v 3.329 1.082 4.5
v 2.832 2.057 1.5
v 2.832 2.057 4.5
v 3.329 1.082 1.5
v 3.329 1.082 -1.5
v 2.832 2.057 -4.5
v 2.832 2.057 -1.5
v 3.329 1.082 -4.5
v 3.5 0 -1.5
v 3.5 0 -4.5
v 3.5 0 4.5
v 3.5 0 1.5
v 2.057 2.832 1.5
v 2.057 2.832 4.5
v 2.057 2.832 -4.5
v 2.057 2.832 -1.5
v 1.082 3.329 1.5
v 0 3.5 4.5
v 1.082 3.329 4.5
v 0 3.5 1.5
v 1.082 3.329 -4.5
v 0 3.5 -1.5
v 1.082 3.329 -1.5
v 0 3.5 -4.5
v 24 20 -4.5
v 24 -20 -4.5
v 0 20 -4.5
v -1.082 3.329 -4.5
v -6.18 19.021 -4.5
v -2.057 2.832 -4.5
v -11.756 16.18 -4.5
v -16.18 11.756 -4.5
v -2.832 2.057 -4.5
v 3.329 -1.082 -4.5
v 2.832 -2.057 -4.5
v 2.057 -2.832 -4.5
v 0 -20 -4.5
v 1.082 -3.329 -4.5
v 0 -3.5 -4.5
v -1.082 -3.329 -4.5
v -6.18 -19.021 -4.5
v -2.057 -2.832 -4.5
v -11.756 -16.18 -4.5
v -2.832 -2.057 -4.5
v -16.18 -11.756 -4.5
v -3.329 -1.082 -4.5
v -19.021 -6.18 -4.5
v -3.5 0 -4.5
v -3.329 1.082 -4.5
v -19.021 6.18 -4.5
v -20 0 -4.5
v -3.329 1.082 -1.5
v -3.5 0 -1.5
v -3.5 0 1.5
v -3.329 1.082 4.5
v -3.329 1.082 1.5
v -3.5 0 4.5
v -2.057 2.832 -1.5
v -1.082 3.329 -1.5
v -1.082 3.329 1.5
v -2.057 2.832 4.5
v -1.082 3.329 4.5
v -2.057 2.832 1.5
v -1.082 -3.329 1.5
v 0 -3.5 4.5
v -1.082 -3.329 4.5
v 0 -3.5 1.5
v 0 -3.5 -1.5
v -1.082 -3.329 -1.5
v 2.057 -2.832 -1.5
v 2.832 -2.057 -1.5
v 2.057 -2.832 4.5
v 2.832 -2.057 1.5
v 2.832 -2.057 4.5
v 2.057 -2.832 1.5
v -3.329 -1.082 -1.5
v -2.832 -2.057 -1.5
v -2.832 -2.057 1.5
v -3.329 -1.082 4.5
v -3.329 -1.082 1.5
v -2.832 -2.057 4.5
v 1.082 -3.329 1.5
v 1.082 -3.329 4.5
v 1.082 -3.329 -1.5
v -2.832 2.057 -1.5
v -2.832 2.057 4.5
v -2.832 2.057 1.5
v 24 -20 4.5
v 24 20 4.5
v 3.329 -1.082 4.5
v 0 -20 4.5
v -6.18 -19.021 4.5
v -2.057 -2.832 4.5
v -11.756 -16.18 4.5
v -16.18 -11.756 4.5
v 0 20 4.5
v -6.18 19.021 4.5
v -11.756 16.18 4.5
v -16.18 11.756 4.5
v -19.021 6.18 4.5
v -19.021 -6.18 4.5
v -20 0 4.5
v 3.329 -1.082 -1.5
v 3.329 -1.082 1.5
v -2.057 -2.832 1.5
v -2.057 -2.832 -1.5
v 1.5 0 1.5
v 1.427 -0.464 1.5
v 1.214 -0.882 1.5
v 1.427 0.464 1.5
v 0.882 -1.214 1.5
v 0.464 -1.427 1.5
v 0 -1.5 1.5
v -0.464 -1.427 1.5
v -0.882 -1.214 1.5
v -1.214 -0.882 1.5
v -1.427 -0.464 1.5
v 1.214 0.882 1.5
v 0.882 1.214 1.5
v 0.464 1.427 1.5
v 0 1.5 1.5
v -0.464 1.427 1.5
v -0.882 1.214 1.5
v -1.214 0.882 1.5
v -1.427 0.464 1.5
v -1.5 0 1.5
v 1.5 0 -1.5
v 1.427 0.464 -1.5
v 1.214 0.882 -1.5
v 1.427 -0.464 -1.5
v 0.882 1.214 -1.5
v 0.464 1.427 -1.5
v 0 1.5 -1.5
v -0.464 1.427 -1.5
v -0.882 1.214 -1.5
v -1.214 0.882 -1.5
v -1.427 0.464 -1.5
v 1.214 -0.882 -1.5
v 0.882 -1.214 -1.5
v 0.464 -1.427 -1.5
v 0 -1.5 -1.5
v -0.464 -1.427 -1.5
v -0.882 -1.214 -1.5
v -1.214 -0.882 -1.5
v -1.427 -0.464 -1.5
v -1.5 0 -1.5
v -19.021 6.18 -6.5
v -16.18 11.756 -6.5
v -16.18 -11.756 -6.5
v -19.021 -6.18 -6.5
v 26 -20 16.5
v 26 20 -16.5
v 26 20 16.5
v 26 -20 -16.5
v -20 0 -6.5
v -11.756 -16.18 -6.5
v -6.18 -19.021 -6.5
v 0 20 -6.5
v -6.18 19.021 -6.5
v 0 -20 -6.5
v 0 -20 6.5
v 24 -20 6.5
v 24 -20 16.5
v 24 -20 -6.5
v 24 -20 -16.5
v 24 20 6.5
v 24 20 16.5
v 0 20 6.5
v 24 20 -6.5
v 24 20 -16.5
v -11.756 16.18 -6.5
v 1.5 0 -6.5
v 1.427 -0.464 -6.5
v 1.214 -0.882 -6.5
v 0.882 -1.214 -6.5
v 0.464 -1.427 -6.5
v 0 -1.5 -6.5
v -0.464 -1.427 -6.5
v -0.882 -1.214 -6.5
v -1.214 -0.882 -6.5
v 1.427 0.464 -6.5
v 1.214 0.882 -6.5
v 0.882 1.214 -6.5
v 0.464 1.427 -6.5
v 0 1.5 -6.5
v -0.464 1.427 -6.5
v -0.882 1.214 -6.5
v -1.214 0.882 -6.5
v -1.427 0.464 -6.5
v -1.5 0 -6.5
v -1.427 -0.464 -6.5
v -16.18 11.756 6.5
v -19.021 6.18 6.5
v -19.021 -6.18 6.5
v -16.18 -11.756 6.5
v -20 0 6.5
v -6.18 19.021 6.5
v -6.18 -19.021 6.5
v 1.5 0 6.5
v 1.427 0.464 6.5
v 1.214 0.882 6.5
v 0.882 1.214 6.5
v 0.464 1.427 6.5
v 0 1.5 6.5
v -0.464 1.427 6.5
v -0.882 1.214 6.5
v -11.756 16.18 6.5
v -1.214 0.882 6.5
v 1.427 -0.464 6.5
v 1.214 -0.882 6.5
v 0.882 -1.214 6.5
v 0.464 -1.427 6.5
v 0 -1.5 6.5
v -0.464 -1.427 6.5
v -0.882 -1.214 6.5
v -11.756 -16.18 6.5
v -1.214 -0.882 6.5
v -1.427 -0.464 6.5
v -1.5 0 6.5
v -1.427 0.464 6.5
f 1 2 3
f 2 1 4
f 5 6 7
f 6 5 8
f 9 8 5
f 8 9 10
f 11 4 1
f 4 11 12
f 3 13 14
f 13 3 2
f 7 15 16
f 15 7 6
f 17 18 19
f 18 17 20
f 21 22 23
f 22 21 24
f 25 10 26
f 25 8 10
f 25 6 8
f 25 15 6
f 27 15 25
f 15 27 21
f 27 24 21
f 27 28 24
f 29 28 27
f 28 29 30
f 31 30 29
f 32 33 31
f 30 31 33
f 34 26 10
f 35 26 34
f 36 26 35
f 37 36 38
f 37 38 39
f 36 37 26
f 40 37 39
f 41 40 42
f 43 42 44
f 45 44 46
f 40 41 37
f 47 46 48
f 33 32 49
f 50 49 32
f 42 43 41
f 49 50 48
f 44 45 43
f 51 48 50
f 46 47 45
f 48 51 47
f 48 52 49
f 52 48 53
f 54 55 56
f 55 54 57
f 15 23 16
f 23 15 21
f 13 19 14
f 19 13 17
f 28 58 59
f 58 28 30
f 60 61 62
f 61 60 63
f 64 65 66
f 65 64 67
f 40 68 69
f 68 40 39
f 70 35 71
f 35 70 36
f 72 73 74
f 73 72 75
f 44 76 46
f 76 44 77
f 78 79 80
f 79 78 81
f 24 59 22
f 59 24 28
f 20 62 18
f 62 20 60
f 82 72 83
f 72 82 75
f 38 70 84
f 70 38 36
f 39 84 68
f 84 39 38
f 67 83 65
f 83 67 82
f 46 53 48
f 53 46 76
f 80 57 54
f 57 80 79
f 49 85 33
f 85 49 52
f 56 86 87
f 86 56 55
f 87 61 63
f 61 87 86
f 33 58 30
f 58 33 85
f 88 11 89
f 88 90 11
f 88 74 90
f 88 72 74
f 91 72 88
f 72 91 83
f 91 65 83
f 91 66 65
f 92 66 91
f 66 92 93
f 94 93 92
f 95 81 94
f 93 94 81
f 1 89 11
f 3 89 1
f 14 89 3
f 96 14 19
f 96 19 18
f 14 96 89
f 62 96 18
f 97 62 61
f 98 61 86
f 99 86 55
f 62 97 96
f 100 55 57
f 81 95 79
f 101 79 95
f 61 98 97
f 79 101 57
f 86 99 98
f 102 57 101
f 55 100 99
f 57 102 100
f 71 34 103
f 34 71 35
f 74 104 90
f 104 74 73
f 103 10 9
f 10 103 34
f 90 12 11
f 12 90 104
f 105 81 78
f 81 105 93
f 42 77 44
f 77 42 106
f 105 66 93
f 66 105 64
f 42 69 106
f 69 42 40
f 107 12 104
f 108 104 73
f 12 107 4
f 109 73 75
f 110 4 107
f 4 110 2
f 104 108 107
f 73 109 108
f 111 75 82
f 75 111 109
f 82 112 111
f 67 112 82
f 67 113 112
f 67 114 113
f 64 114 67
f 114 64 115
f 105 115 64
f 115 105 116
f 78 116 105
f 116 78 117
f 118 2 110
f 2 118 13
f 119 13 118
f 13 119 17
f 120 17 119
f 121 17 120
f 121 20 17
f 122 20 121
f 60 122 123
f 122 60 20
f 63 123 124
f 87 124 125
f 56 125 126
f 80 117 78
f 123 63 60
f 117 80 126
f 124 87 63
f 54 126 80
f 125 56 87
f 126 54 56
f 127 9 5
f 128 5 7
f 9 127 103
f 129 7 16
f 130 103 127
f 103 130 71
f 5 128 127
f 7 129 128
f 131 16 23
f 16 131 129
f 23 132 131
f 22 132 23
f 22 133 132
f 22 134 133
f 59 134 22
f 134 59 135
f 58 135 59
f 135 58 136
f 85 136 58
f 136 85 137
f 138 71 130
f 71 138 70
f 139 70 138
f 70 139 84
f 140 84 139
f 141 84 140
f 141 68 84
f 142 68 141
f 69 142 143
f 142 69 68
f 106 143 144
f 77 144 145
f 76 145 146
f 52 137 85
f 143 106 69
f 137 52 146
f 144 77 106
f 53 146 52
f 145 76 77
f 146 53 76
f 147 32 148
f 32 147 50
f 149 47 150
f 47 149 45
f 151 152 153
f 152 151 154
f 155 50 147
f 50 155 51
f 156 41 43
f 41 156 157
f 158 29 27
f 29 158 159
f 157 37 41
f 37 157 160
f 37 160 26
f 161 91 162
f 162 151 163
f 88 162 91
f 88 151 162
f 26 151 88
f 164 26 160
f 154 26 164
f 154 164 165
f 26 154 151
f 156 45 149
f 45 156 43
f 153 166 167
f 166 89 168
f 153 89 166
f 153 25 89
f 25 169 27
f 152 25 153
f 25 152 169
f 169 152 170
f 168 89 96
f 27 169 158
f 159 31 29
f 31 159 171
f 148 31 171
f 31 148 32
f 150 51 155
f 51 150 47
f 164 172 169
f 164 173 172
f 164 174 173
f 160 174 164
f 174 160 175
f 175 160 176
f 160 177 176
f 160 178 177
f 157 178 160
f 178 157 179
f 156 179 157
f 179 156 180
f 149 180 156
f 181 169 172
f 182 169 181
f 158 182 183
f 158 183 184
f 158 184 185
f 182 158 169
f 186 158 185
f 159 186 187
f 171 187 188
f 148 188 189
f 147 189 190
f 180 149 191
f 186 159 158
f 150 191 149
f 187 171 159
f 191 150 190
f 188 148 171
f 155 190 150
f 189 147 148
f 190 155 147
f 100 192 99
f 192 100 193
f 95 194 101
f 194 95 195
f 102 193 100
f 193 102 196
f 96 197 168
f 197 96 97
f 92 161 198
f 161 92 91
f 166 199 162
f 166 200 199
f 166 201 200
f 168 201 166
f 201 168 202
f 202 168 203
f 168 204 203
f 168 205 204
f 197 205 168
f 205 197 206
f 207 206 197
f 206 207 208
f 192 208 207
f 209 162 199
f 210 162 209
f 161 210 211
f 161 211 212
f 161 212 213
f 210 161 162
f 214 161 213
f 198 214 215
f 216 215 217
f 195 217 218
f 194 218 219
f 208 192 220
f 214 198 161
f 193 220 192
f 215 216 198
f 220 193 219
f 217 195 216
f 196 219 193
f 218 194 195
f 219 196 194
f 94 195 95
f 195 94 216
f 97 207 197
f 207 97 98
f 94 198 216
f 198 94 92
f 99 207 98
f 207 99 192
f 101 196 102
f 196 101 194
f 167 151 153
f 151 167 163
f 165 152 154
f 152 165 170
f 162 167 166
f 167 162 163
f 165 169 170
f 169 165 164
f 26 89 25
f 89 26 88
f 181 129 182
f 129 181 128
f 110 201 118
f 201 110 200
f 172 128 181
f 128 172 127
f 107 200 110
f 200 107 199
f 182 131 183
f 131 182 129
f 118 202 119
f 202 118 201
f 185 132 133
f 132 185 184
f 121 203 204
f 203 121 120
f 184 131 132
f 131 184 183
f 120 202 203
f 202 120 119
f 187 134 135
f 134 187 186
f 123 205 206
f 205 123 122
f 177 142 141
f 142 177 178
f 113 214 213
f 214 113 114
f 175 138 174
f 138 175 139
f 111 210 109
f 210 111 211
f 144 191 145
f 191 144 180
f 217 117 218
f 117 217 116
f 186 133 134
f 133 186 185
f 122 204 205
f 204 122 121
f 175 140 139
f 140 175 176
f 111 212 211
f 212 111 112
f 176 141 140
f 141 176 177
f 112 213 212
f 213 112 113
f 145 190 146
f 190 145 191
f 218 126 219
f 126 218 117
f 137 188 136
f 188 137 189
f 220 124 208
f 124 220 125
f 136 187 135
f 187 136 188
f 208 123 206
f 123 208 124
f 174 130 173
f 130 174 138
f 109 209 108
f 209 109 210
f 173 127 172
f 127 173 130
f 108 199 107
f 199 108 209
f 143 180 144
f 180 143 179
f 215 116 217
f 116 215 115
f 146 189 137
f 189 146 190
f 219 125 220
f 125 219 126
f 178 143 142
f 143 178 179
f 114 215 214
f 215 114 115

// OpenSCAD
module pulley_bracket(shaft_radius=1.5, bearing_width=3, pulley_width=5, pulley_radius=20, side_clearance=2, base_clearance=5, wall_thickness=2, base_width=10, $fn=20){
	// face
	face_displacement = wall_thickness * 0.5 + pulley_width * 0.5 + side_clearance;
	spacer_height = face_displacement - bearing_width;
	difference(){
		union(){
			// face 0
			hull(){
				translate([0,0,-face_displacement])
					cylinder(r=pulley_radius, h=wall_thickness, center=true);
				translate([pulley_radius + base_clearance, 0, -face_displacement])
					cube([wall_thickness, pulley_radius * 2, wall_thickness], true);
			}

			// face 1
			hull(){
				translate([0,0,face_displacement])
					cylinder(r=pulley_radius, h=wall_thickness, center=true);

				translate([pulley_radius + base_clearance, 0, face_displacement])
					cube([wall_thickness, pulley_radius * 2, wall_thickness], true);
			}

			// base
			//
			translate([pulley_radius + base_clearance, 0, 0])
				cube([wall_thickness, pulley_radius * 2, side_clearance * 2 + pulley_width + (wall_thickness + base_width) * 2], true);
			// spacers
			difference(){
				cylinder(r=shaft_radius + wall_thickness, h=side_clearance * 2 + pulley_width, center=true, $fn=$fn);
				cube([(shaft_radius + wall_thickness) * 2, (shaft_radius + wall_thickness) * 2, bearing_width], center=true);
			}
		};
		cylinder(r=shaft_radius, h=1 + side_clearance * 2 + pulley_width + wall_thickness * 2, center=true, $fn=$fn);
	}
}
pulley_bracket();
